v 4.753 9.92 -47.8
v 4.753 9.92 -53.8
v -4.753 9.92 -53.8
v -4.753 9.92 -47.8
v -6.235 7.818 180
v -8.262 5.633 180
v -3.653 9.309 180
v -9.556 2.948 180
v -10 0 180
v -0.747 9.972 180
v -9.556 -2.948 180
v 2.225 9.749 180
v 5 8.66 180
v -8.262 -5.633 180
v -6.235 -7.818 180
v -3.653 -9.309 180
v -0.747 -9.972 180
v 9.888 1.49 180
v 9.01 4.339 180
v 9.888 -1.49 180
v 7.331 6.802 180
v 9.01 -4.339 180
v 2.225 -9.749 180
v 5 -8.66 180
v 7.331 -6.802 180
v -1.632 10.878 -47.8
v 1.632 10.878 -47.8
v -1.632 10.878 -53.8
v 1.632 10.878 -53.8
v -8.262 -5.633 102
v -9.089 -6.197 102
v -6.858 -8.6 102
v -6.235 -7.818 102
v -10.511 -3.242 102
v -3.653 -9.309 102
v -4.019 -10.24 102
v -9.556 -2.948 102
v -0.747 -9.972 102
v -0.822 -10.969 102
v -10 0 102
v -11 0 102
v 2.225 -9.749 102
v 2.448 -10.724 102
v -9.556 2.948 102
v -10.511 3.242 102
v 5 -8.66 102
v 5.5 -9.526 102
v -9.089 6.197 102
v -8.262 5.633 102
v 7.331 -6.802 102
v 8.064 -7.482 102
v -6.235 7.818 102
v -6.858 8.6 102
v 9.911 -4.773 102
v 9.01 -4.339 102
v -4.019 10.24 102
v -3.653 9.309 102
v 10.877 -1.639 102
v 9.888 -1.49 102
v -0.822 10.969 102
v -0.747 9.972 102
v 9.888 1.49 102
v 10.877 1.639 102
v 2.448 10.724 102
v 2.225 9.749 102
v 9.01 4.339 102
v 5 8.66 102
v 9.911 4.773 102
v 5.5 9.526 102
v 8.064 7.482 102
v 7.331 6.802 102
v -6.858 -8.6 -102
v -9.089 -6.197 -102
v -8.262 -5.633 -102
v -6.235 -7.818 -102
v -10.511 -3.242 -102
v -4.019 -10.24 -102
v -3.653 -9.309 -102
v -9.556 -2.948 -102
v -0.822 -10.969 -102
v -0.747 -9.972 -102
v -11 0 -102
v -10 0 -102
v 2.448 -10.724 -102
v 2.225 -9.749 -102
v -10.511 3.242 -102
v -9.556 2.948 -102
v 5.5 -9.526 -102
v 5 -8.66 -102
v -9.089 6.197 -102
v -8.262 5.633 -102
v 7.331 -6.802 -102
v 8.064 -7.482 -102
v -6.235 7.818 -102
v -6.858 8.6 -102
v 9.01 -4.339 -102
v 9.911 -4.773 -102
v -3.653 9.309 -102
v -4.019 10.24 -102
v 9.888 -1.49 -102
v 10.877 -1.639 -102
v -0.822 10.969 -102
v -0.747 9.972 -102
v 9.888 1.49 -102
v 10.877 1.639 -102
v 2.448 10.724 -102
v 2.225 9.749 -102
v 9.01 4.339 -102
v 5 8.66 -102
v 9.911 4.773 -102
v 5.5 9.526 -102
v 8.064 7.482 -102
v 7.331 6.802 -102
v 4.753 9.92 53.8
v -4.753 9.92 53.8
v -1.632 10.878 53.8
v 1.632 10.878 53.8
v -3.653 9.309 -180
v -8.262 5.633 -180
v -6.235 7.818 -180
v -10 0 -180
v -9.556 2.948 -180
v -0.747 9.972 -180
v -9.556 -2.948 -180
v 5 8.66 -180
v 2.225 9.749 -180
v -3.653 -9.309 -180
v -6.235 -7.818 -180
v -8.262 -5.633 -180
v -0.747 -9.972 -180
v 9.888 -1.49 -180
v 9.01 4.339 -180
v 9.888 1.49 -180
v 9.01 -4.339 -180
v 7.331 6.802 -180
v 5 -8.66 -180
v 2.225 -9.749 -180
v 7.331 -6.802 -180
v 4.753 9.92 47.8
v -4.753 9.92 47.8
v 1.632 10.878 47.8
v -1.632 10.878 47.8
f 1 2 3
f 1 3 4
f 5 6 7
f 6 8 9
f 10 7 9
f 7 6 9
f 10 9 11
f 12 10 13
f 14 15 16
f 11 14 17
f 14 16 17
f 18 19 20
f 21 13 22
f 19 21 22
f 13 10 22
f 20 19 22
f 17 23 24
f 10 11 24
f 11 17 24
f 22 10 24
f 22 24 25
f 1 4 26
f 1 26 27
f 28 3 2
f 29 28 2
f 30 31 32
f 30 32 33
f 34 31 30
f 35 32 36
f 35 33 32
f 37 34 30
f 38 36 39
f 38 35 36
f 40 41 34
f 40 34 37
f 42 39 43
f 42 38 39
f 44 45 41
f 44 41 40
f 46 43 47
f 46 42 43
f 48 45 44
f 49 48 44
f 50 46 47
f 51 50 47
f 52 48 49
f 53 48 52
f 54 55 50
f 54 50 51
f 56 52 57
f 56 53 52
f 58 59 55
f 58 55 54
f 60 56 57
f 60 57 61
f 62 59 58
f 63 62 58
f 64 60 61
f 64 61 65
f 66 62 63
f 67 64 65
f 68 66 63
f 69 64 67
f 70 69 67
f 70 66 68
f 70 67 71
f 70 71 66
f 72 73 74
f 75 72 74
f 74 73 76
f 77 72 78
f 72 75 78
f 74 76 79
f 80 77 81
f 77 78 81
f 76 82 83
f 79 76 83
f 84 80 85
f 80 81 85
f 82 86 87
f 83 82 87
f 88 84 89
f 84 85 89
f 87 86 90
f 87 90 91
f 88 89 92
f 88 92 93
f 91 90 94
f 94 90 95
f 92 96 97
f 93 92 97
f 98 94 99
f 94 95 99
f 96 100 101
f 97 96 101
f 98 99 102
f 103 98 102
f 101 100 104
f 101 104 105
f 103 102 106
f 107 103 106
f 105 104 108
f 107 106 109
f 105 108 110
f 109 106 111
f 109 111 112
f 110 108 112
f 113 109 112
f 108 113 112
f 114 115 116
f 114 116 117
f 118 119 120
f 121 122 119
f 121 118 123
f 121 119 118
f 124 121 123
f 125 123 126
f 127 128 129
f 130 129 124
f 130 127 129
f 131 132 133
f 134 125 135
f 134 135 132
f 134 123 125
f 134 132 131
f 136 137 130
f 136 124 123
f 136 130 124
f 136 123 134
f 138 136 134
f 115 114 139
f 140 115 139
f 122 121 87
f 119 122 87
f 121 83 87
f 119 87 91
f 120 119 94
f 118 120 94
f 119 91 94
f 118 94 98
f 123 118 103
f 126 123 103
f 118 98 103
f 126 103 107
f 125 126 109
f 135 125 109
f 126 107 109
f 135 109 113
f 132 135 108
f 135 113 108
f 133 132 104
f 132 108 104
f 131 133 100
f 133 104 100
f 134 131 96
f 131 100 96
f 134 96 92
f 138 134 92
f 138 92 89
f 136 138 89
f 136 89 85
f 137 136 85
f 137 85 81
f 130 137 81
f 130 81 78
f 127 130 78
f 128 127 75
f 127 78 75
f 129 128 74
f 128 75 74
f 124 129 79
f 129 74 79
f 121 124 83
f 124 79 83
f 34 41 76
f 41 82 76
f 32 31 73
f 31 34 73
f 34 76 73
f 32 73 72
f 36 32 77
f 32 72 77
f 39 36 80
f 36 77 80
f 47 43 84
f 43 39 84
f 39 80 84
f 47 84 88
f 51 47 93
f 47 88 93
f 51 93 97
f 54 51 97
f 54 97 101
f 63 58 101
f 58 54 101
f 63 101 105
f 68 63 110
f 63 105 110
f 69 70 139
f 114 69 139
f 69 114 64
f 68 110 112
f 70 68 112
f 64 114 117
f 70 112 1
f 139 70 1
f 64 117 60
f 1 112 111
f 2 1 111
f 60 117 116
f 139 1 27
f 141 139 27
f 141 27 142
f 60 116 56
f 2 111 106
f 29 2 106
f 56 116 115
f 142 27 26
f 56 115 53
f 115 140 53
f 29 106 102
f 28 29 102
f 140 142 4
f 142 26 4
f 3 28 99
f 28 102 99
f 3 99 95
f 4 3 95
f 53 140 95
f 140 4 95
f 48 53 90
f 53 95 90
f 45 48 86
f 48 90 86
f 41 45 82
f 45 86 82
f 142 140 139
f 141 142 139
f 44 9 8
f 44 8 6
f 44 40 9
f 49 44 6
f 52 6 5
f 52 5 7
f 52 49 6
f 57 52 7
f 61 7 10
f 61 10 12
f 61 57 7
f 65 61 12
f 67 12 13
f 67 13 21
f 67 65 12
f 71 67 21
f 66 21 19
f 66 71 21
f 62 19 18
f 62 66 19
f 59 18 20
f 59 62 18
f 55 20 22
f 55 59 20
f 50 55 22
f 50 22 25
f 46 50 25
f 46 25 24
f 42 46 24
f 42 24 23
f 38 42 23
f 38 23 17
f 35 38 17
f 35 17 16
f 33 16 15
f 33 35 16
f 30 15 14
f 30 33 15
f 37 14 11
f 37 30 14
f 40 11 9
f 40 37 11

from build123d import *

# Parameters (mm, degrees)
SKETCH1_W          = 360
SKETCH1_H          = 11
SKETCH4_W          = 6
SKETCH4_H          = 10
CUT_EXTRUDE1_DEPTH = 181.670971658
SKETCH6_W          = 78
SKETCH6_H          = 1


with BuildPart() as part:
    # Sketch1 → Revolve1 (revolve)
    with BuildSketch(Plane(origin=(0, 0, 0), x_dir=(0, 0, -1), z_dir=(1, 0, 0)), mode=Mode.PRIVATE) as revolve1_sk:
        with Locations((0, 5.5)):
            Rectangle(SKETCH1_W, SKETCH1_H)
    revolve(revolve1_sk.sketch.rotate(Axis((0, 0, -180), (0, 0, 1)), 90), axis=Axis((0, 0, -180), (0, 0, 1)))

    # Sketch4 → Cut-Extrude1 (cut, symmetric)
    with BuildSketch(Plane(origin=(0, 0, 0), x_dir=(0, 0, -1), z_dir=(1, 0, 0))):
        with Locations((-50.8, 14.92)):
            Rectangle(SKETCH4_W, SKETCH4_H)
    cut_extrude1 = extrude(amount=CUT_EXTRUDE1_DEPTH, both=True, mode=Mode.SUBTRACT)

    # Sketch6 → Cut-Revolve1 (revolve, cut)
    with BuildSketch(Plane(origin=(0, 0, 0), x_dir=(0, 0, -1), z_dir=(1, 0, 0)), mode=Mode.PRIVATE) as cut_revolve1_sk:
        with Locations((-141, 10.5)):
            Rectangle(SKETCH6_W, SKETCH6_H)
    cut_revolve1 = revolve(cut_revolve1_sk.sketch.rotate(Axis((0, 0, -180), (0, 0, -1)), 270), axis=Axis((0, 0, -180), (0, 0, -1)), mode=Mode.SUBTRACT)

    # Mirror2: Cut-Extrude1, Cut-Revolve1 across plane
    add(cut_extrude1.mirror(Plane.XY), mode=Mode.SUBTRACT)
    add(cut_revolve1.mirror(Plane.XY), mode=Mode.SUBTRACT)


solid = part.part
